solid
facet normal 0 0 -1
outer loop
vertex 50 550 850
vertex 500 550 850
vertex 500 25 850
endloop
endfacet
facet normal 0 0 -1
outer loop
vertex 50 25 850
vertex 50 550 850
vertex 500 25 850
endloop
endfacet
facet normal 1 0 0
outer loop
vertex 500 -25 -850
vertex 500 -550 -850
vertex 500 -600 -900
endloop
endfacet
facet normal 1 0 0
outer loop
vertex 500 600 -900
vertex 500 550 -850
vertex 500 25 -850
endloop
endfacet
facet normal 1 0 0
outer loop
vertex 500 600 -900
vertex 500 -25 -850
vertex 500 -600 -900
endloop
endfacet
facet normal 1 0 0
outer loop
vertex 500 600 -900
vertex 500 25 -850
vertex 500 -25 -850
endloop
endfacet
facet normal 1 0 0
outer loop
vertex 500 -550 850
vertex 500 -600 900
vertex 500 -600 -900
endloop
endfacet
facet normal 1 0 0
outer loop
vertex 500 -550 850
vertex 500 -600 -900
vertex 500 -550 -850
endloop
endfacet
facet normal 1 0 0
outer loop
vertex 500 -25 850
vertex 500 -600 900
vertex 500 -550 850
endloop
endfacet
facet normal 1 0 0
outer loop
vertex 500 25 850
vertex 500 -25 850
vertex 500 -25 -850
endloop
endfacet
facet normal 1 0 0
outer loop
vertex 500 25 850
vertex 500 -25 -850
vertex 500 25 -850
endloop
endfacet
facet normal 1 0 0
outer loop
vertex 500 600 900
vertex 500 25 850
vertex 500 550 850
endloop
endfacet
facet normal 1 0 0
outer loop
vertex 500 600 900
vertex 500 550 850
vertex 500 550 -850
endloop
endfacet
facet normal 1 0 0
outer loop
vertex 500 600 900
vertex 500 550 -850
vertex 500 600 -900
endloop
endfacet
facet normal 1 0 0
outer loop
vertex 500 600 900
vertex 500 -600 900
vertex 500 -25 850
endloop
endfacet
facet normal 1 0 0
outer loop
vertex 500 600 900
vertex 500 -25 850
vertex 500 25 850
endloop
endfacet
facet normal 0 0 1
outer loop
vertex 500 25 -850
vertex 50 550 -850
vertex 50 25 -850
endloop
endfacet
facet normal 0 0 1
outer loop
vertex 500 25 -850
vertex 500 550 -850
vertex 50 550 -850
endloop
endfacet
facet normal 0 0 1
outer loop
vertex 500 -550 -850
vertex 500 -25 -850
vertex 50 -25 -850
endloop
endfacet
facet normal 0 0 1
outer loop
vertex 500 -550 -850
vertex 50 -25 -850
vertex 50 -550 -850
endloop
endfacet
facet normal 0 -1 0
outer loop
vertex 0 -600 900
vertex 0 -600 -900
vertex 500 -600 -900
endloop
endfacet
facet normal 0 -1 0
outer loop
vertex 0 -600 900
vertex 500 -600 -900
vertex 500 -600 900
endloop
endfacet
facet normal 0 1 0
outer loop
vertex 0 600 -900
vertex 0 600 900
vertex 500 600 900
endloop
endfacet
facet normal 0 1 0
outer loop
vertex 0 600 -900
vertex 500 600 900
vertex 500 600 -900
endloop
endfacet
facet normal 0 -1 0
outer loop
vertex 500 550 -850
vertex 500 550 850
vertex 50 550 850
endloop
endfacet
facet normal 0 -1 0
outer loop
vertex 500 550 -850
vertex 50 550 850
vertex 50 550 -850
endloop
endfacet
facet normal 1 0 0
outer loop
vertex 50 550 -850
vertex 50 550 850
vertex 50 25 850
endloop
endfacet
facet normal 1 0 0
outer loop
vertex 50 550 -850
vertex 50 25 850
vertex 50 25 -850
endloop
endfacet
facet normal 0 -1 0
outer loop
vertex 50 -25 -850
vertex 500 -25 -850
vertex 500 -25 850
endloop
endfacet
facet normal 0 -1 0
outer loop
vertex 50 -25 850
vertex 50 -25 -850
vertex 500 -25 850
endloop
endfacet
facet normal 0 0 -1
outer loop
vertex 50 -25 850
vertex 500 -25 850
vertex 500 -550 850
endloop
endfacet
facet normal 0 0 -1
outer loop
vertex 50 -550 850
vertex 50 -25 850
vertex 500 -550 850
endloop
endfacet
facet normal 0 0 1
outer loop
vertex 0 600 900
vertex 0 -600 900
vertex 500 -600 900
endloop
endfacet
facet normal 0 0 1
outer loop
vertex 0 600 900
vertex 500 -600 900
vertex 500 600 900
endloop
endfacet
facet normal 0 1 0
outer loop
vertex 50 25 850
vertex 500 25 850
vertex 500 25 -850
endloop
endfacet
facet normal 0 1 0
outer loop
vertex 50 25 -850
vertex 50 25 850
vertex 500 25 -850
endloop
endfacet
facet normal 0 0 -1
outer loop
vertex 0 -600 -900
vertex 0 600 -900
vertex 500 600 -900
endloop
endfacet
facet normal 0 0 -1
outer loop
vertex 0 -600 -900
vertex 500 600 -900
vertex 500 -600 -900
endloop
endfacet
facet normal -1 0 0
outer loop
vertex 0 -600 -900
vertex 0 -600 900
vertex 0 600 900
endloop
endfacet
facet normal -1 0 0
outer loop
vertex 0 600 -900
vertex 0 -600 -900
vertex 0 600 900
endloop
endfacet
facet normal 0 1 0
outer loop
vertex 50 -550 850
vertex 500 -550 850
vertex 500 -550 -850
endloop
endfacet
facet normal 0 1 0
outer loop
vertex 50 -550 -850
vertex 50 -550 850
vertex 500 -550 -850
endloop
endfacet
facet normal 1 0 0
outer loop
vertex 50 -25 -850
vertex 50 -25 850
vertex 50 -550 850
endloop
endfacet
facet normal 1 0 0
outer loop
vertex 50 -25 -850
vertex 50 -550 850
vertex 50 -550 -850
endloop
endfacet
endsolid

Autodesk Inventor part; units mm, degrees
ref_plane "YZ Plane" through (0, 0, 0) normal (1, 0, 0) x (0, 1, 0)
ref_plane "XZ Plane" through (0, 0, 0) normal (0, 1, 0) x (-1, 0, 0)
ref_plane "XY Plane" through (0, 0, 0) normal (0, 0, 1) x (1, 0, 0)
sketch "草图1" plane through (0, 0, 0) normal (1, 0, 0) x (0, 1, 0)
  line L0 (-600, 900) -> (600, 900)
  line L1 (600, 900) -> (600, -900)
  line L2 (600, -900) -> (-600, -900)
  line L3 (-600, -900) -> (-600, 900)
  line L4 (-600, 900) -> (600, -900) construction
  line L5 (600, 900) -> (-600, -900) construction
  point P0 (0, 0)
  dimension "d0" = 1200
  dimension "d1" = 1800
extrude "拉伸1" add sketch "草图1" along normal blind 500
sketch "草图2" plane through (500, 0, 0) normal (1, 0, 0) x (0, 0, -1)
  line L0 (-900, 600) -> (-900, -600) projected
  line L1 (-900, 600) -> (-850, 600)
  line L2 (900, -600) -> (900, 600) projected
  line L3 (-850, 600) -> (-850, -600)
  line L4 (-900, -600) -> (-900, -550)
  line L5 (-900, -550) -> (900, -550)
  line L6 (-900, 600) -> (-900, 550)
  line L7 (-900, 550) -> (900, 550)
  line L8 (900, 600) -> (-900, 600) projected
  line L9 (900, 600) -> (850, 600)
  line L10 (850, 600) -> (850, -600)
  line L11 (-900, -600) -> (900, -600) projected
  line L12 (-850, 0) -> (-850, -25)
  line L13 (-850, -25) -> (-850, 25)
  line L14 (-850, 25) -> (850, 25)
  line L15 (850, -25) -> (-850, -25)
  point P0 (0, 0)
  point P1 (-850, -550)
  point P2 (850, -550)
  point P3 (850, 550)
  point P4 (-850, 550)
  dimension "d10" = 50
  dimension "d11" = 50
  dimension "d12" = 50
  dimension "d13" = 50
  dimension "d14" = 25
  dimension "d15" = 50
extrude "拉伸2" cut sketch "草图2" against normal blind 450 contours L7 L10 L14 L3 | L3 L15 L10 L5
properties part number "书架" material "木材(枫木)"
